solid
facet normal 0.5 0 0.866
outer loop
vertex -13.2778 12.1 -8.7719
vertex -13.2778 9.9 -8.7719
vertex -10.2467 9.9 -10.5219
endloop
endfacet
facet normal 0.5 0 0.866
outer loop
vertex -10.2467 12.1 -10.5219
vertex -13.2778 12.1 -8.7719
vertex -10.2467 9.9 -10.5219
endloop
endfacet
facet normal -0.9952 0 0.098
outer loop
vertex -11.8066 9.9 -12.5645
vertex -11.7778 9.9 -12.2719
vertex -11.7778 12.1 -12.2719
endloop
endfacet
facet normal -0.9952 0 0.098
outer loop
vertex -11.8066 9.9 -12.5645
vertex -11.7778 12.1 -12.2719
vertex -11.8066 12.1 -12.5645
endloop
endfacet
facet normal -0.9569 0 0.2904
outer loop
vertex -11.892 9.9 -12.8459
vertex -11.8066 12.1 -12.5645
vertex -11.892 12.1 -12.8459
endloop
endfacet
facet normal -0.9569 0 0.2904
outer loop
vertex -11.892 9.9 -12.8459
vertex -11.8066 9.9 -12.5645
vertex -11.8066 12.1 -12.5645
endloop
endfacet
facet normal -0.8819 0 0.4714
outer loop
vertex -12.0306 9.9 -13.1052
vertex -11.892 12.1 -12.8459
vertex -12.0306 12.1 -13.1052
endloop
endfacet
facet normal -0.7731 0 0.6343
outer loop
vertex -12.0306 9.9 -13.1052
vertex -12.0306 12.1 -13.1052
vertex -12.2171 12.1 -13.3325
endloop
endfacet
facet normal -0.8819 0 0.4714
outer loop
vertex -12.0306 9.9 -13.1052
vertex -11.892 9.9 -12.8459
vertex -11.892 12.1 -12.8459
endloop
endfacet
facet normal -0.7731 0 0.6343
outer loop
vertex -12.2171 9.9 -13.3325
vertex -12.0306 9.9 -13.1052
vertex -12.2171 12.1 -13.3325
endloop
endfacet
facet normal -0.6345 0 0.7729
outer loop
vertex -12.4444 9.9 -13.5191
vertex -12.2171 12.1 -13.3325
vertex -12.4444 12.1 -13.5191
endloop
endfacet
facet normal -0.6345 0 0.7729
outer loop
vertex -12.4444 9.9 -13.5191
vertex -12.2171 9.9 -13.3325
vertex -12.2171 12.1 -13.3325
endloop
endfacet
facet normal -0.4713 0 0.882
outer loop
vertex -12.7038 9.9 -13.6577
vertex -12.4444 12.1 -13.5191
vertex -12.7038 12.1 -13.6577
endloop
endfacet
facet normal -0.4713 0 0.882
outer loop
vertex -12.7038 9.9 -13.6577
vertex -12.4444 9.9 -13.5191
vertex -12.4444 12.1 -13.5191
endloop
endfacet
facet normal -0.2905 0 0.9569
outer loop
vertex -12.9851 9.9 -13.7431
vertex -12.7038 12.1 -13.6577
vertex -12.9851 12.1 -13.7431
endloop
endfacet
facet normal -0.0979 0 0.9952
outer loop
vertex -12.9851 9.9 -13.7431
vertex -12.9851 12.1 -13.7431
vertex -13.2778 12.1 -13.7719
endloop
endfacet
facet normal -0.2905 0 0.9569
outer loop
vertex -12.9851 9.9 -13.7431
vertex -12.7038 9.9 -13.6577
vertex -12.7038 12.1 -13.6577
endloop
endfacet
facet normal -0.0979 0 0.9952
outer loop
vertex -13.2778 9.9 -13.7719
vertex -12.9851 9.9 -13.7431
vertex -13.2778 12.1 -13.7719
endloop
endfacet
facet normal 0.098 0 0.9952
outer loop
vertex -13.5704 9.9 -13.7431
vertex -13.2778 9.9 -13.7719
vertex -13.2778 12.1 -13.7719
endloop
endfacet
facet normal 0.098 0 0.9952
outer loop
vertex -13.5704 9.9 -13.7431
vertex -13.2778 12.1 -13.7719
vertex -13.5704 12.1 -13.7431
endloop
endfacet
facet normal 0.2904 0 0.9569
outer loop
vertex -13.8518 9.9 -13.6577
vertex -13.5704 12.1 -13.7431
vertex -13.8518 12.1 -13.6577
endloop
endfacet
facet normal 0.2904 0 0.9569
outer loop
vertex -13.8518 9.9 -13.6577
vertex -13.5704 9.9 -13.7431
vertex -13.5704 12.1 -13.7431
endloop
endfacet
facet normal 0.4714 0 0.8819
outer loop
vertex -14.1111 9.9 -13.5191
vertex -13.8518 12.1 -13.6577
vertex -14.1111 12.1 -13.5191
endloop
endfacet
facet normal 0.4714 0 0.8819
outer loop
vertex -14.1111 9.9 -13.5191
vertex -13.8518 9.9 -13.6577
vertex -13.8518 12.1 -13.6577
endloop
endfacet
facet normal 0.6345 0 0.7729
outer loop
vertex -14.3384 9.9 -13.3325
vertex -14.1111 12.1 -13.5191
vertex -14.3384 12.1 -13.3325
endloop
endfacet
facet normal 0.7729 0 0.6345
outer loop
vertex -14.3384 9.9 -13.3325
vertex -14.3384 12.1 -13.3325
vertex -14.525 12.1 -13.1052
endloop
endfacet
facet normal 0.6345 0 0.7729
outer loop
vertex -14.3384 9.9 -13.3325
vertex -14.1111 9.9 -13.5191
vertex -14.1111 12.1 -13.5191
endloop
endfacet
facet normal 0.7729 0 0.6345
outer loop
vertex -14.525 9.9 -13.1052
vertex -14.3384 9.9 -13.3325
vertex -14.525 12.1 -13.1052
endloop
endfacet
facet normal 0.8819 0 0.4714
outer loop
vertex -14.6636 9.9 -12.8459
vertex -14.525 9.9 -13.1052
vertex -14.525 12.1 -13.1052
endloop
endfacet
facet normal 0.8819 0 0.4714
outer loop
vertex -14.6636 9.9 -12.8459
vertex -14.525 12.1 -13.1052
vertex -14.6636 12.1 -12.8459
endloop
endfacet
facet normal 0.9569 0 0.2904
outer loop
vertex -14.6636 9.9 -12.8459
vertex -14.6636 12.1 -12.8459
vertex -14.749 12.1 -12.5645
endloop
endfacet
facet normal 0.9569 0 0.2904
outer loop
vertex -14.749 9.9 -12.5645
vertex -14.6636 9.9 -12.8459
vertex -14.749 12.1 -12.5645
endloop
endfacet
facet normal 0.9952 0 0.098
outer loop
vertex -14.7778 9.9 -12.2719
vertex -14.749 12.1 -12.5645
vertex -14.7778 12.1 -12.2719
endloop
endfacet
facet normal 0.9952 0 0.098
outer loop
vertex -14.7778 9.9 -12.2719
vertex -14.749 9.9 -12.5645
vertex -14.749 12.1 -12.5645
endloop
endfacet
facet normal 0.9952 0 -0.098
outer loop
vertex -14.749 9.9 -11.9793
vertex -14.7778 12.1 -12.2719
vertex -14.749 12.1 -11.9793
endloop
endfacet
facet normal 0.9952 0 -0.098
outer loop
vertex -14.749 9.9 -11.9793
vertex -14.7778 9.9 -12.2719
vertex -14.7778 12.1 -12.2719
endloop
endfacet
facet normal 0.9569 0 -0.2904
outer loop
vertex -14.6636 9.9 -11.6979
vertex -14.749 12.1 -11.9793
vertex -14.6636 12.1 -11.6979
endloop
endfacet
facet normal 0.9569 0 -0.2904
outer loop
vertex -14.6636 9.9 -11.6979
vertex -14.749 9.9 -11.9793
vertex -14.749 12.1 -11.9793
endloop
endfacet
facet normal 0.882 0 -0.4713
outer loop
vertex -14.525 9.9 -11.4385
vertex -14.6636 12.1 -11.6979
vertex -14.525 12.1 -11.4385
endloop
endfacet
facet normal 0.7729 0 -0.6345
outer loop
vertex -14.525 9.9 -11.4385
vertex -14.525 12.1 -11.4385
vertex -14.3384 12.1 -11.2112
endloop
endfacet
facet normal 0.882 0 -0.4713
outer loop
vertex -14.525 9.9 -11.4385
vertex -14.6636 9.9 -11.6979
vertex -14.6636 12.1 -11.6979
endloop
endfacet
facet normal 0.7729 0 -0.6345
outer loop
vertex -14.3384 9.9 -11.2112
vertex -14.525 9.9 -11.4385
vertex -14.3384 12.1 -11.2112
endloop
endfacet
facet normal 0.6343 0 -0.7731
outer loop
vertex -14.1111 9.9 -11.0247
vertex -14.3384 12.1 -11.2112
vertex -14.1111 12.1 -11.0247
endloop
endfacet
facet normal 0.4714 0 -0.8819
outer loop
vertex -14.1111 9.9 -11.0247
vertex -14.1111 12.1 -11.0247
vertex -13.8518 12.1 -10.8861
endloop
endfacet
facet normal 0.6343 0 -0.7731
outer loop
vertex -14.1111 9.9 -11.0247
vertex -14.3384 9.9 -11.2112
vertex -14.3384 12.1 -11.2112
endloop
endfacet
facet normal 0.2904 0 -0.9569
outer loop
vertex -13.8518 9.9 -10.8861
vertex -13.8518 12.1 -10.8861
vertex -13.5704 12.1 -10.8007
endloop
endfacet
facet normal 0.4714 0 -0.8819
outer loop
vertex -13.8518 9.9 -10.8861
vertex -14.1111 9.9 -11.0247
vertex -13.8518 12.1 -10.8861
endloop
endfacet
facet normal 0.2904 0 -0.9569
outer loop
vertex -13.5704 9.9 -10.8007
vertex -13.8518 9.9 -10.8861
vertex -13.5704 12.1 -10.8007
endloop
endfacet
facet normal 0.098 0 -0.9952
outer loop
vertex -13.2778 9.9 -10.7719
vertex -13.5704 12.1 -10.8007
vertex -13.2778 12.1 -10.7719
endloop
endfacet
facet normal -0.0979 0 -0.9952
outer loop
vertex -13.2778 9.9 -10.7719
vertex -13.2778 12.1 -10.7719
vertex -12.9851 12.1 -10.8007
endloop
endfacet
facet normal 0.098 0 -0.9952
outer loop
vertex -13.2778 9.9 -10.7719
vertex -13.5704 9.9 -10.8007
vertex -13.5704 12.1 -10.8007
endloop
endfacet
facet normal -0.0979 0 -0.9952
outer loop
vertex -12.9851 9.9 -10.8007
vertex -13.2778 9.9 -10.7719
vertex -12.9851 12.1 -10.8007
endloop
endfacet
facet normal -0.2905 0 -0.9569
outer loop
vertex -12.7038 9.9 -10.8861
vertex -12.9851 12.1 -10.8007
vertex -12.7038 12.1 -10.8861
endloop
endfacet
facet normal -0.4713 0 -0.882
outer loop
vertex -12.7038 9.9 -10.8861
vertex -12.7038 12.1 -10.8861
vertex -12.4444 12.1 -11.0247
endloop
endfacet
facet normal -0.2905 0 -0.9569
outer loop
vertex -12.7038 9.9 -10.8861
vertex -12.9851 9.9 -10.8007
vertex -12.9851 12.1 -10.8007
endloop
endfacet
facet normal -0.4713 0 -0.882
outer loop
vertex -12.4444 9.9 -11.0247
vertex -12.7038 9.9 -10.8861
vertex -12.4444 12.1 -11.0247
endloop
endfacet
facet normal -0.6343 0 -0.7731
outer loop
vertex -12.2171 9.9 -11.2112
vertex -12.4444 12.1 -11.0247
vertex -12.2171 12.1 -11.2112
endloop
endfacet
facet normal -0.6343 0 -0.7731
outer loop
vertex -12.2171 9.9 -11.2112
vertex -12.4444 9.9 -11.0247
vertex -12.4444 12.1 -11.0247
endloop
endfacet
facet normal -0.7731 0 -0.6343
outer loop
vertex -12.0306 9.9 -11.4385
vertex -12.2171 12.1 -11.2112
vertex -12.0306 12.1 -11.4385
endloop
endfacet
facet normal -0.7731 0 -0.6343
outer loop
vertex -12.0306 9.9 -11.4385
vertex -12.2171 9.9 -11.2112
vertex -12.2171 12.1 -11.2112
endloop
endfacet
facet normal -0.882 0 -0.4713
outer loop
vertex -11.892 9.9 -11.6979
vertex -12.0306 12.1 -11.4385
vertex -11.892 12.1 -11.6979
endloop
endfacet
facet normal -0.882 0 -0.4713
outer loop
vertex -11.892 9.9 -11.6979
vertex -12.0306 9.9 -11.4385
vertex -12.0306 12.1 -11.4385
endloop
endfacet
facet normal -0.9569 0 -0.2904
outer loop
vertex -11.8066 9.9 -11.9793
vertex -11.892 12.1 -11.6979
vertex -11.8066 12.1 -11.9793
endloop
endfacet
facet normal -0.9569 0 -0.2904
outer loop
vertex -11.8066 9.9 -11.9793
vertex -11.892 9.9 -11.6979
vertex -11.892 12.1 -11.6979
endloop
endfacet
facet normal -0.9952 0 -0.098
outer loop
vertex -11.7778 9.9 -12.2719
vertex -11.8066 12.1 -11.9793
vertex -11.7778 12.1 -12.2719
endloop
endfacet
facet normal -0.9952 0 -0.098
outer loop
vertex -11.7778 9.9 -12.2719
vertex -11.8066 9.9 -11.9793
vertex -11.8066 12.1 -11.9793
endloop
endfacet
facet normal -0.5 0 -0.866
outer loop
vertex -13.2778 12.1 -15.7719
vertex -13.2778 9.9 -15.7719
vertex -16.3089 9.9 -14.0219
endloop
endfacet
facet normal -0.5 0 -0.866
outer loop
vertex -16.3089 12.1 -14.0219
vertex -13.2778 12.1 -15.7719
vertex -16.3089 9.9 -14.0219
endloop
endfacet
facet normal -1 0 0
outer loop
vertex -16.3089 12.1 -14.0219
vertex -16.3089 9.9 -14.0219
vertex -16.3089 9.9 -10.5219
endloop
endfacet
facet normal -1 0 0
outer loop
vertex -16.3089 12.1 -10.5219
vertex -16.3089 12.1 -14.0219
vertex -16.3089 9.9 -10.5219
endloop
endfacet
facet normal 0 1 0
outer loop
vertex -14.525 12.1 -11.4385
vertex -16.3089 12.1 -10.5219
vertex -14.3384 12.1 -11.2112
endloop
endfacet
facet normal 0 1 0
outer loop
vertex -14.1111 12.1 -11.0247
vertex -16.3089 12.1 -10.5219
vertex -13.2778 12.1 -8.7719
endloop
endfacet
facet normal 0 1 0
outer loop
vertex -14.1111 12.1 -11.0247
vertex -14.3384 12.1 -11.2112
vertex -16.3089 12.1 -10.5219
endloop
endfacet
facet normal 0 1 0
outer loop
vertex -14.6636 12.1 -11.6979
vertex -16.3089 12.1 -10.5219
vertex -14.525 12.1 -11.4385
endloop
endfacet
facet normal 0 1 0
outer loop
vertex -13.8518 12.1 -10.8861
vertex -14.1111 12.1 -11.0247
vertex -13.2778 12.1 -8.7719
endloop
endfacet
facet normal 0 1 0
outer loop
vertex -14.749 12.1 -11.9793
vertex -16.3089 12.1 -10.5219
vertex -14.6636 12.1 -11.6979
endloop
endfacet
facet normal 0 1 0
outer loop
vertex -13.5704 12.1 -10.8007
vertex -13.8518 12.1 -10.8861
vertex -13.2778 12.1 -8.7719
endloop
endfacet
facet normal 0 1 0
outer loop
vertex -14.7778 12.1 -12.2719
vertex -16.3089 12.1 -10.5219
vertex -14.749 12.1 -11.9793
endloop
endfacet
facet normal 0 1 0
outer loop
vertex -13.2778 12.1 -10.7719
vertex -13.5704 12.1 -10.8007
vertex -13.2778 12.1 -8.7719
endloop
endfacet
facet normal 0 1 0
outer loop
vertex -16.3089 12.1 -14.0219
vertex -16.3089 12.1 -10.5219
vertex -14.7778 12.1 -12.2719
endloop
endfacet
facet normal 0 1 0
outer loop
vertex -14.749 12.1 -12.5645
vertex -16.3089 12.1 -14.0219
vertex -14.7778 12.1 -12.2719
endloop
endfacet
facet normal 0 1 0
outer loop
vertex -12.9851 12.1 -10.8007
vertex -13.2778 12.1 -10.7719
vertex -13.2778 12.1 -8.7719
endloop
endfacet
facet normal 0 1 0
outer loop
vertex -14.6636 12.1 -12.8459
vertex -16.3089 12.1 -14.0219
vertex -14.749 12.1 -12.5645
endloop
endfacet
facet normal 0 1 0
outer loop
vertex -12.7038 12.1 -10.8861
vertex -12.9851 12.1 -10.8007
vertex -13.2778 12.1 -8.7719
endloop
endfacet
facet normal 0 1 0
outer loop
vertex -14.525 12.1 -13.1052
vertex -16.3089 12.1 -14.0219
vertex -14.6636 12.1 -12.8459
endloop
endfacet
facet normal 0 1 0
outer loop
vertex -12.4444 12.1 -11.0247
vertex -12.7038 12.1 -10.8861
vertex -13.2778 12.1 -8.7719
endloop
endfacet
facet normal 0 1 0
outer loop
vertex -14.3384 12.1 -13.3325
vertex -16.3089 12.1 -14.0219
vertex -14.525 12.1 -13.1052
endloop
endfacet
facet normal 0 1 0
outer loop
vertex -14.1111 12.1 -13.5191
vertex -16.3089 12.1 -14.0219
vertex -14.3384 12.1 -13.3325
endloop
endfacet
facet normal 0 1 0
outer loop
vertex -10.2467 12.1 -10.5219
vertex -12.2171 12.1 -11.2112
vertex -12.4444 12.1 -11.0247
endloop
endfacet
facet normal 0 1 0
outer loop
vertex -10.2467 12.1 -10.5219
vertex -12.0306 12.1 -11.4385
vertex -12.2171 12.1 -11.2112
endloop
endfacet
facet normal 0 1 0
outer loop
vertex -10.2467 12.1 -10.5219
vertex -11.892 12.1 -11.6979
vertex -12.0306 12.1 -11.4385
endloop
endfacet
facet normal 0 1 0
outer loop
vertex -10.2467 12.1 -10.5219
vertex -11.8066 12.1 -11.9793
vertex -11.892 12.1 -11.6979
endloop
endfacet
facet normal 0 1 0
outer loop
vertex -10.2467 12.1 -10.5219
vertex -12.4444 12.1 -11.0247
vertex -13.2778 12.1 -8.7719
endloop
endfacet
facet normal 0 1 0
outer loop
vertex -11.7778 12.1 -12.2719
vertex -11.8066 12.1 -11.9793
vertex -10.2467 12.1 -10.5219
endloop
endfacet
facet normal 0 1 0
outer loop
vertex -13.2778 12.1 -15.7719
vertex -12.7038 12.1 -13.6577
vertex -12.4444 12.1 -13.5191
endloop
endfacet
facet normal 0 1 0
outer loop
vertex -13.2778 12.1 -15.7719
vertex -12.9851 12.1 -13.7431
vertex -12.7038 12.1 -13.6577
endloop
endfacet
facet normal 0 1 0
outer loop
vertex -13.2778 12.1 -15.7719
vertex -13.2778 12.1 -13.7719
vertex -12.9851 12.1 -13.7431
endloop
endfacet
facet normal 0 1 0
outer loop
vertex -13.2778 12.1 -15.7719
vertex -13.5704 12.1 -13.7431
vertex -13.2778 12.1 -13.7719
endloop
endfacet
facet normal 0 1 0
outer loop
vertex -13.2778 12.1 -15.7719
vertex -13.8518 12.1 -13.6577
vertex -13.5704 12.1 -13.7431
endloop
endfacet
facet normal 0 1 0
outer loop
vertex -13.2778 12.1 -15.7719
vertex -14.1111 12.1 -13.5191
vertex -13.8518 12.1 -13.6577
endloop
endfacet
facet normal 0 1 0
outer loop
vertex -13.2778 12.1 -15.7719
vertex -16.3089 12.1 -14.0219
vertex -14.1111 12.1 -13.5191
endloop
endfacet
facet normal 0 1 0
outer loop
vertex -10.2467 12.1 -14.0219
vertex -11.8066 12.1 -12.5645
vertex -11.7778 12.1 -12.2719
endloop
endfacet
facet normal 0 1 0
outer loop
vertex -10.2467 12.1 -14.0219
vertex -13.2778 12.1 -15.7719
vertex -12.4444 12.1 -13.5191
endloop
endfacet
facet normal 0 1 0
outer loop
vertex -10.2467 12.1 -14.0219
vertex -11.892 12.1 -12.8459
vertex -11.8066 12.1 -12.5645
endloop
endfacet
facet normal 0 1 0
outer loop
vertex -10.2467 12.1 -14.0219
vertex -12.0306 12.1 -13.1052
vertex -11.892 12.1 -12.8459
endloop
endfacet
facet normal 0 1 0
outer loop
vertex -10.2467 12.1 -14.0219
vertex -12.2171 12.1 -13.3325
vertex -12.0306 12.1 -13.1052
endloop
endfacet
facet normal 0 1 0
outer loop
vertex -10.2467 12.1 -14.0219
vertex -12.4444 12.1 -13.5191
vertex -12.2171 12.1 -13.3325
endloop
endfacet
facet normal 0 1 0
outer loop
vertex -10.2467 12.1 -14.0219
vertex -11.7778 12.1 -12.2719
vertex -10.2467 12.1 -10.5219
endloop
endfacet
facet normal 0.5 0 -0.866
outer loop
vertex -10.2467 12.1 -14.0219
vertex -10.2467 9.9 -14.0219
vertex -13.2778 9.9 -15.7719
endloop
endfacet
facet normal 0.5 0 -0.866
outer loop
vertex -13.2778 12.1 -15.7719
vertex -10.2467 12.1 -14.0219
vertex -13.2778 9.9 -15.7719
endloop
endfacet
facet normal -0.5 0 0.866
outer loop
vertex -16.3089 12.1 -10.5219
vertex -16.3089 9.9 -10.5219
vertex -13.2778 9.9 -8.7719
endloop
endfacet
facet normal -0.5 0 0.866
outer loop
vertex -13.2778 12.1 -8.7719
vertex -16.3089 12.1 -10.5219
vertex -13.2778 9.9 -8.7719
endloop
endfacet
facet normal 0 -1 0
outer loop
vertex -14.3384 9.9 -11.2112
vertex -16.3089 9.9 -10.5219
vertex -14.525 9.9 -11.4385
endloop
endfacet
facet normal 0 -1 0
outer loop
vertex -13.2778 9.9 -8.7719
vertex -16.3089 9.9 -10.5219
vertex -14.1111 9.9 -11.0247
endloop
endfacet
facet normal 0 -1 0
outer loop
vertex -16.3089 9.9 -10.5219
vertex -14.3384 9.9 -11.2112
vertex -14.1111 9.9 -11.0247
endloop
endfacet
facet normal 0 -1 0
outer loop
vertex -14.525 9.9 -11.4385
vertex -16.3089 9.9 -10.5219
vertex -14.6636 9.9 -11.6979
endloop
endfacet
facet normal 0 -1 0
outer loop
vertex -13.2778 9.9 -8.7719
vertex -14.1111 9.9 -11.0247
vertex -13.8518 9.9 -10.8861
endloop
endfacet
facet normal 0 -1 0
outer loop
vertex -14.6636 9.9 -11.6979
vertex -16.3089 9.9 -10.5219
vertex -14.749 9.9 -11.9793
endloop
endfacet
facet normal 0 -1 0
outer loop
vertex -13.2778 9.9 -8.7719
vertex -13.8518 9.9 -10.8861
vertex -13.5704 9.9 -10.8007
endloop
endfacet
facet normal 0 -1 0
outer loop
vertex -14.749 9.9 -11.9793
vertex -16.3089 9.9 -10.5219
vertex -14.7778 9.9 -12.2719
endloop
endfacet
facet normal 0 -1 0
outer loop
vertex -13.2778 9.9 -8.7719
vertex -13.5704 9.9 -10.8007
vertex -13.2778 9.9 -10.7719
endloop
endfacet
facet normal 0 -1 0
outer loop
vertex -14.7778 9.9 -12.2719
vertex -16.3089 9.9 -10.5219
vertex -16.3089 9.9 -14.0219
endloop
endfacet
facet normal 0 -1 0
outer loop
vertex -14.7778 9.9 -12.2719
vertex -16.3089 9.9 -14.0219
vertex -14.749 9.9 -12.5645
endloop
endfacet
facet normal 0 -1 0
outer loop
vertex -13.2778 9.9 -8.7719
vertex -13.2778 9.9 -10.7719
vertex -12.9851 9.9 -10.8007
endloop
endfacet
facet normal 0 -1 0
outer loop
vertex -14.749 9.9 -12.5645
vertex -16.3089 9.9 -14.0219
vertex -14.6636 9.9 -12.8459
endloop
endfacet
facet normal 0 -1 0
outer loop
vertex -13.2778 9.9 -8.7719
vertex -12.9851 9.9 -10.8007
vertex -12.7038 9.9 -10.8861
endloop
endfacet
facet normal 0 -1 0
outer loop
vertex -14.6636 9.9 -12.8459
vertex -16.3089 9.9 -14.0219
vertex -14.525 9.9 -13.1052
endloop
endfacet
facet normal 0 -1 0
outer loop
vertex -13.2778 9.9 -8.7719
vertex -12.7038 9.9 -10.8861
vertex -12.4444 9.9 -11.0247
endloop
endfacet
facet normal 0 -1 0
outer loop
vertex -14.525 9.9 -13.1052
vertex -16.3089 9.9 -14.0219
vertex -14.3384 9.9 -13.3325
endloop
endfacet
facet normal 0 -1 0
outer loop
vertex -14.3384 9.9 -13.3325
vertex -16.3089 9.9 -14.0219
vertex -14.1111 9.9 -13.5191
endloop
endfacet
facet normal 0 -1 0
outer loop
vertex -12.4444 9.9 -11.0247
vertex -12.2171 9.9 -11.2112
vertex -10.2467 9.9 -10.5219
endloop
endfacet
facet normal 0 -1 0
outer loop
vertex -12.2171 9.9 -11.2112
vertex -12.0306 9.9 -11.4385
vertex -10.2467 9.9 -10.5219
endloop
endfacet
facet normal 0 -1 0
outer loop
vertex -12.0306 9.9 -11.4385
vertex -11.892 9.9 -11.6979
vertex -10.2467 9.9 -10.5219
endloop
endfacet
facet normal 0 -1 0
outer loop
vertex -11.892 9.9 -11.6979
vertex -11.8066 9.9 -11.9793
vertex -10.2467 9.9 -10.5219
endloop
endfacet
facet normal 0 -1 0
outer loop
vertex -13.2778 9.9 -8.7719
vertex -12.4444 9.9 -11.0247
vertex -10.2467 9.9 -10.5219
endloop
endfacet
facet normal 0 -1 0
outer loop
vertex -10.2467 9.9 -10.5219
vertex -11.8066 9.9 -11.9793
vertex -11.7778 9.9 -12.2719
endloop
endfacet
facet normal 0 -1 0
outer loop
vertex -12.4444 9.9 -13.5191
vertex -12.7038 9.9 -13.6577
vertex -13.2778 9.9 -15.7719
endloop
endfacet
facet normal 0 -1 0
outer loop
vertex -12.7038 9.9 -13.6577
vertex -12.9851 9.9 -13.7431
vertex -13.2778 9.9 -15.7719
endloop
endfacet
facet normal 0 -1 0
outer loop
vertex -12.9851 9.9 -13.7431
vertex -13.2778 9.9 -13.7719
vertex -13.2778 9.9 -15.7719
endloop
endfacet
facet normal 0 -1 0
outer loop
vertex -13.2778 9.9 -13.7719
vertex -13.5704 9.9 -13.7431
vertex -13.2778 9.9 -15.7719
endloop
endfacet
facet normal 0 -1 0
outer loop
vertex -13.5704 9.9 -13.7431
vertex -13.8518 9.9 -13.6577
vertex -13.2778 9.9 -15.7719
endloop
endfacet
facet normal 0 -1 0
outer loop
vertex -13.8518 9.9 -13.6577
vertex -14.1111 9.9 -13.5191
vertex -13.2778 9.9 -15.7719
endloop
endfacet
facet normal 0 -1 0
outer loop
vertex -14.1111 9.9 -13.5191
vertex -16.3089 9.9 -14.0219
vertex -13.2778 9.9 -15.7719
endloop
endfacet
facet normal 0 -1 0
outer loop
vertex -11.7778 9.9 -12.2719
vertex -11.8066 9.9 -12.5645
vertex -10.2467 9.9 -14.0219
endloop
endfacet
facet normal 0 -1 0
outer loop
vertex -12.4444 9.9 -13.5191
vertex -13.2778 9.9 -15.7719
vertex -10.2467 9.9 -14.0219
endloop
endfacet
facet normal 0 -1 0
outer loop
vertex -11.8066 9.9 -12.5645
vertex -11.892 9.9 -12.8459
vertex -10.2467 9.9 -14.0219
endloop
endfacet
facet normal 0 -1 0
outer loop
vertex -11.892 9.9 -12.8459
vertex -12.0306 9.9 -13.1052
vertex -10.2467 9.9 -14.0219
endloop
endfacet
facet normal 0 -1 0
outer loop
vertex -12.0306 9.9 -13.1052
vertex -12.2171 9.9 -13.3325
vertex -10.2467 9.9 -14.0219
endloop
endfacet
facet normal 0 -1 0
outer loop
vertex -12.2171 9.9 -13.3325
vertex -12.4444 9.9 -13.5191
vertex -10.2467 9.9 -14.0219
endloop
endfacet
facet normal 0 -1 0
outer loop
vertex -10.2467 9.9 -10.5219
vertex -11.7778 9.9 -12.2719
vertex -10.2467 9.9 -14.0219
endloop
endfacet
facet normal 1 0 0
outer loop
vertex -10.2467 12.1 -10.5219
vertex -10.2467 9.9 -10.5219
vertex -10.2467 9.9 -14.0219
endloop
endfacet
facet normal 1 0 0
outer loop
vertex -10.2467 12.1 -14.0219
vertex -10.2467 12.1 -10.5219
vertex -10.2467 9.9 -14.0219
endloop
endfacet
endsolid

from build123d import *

# Parameters (mm, degrees)
SKETCH1_R           = 15
BOSS_EXTRUDE1_DEPTH = 22
SCALE1_SCALE        = 0.1


with BuildPart() as part:
    # Sketch1 → Boss-Extrude1 (new body)
    with BuildSketch(Plane(origin=(0, 0, 0), x_dir=(1, 0, 0), z_dir=(0, 1, 0))):
        Polygon((17.033110265, -5.228113471), (17.033110265, 29.771886529), (-13.277778868, 47.271886529), (-43.588668, 29.771886529), (-43.588668, -5.228113471), (-13.277778868, -22.728113471), align=None)
        with Locations((-13.277778868, 12.271886529)):
            Circle(SKETCH1_R, mode=Mode.SUBTRACT)
    extrude(amount=BOSS_EXTRUDE1_DEPTH)


with BuildPart() as part_1:
    # Scale1: scaled about (-13.277778868, 11, -12.271886529)
    add(part.part.scale(SCALE1_SCALE).moved(Location((-11.950000981, 9.9, -11.044697876))))


solid = part_1.part
